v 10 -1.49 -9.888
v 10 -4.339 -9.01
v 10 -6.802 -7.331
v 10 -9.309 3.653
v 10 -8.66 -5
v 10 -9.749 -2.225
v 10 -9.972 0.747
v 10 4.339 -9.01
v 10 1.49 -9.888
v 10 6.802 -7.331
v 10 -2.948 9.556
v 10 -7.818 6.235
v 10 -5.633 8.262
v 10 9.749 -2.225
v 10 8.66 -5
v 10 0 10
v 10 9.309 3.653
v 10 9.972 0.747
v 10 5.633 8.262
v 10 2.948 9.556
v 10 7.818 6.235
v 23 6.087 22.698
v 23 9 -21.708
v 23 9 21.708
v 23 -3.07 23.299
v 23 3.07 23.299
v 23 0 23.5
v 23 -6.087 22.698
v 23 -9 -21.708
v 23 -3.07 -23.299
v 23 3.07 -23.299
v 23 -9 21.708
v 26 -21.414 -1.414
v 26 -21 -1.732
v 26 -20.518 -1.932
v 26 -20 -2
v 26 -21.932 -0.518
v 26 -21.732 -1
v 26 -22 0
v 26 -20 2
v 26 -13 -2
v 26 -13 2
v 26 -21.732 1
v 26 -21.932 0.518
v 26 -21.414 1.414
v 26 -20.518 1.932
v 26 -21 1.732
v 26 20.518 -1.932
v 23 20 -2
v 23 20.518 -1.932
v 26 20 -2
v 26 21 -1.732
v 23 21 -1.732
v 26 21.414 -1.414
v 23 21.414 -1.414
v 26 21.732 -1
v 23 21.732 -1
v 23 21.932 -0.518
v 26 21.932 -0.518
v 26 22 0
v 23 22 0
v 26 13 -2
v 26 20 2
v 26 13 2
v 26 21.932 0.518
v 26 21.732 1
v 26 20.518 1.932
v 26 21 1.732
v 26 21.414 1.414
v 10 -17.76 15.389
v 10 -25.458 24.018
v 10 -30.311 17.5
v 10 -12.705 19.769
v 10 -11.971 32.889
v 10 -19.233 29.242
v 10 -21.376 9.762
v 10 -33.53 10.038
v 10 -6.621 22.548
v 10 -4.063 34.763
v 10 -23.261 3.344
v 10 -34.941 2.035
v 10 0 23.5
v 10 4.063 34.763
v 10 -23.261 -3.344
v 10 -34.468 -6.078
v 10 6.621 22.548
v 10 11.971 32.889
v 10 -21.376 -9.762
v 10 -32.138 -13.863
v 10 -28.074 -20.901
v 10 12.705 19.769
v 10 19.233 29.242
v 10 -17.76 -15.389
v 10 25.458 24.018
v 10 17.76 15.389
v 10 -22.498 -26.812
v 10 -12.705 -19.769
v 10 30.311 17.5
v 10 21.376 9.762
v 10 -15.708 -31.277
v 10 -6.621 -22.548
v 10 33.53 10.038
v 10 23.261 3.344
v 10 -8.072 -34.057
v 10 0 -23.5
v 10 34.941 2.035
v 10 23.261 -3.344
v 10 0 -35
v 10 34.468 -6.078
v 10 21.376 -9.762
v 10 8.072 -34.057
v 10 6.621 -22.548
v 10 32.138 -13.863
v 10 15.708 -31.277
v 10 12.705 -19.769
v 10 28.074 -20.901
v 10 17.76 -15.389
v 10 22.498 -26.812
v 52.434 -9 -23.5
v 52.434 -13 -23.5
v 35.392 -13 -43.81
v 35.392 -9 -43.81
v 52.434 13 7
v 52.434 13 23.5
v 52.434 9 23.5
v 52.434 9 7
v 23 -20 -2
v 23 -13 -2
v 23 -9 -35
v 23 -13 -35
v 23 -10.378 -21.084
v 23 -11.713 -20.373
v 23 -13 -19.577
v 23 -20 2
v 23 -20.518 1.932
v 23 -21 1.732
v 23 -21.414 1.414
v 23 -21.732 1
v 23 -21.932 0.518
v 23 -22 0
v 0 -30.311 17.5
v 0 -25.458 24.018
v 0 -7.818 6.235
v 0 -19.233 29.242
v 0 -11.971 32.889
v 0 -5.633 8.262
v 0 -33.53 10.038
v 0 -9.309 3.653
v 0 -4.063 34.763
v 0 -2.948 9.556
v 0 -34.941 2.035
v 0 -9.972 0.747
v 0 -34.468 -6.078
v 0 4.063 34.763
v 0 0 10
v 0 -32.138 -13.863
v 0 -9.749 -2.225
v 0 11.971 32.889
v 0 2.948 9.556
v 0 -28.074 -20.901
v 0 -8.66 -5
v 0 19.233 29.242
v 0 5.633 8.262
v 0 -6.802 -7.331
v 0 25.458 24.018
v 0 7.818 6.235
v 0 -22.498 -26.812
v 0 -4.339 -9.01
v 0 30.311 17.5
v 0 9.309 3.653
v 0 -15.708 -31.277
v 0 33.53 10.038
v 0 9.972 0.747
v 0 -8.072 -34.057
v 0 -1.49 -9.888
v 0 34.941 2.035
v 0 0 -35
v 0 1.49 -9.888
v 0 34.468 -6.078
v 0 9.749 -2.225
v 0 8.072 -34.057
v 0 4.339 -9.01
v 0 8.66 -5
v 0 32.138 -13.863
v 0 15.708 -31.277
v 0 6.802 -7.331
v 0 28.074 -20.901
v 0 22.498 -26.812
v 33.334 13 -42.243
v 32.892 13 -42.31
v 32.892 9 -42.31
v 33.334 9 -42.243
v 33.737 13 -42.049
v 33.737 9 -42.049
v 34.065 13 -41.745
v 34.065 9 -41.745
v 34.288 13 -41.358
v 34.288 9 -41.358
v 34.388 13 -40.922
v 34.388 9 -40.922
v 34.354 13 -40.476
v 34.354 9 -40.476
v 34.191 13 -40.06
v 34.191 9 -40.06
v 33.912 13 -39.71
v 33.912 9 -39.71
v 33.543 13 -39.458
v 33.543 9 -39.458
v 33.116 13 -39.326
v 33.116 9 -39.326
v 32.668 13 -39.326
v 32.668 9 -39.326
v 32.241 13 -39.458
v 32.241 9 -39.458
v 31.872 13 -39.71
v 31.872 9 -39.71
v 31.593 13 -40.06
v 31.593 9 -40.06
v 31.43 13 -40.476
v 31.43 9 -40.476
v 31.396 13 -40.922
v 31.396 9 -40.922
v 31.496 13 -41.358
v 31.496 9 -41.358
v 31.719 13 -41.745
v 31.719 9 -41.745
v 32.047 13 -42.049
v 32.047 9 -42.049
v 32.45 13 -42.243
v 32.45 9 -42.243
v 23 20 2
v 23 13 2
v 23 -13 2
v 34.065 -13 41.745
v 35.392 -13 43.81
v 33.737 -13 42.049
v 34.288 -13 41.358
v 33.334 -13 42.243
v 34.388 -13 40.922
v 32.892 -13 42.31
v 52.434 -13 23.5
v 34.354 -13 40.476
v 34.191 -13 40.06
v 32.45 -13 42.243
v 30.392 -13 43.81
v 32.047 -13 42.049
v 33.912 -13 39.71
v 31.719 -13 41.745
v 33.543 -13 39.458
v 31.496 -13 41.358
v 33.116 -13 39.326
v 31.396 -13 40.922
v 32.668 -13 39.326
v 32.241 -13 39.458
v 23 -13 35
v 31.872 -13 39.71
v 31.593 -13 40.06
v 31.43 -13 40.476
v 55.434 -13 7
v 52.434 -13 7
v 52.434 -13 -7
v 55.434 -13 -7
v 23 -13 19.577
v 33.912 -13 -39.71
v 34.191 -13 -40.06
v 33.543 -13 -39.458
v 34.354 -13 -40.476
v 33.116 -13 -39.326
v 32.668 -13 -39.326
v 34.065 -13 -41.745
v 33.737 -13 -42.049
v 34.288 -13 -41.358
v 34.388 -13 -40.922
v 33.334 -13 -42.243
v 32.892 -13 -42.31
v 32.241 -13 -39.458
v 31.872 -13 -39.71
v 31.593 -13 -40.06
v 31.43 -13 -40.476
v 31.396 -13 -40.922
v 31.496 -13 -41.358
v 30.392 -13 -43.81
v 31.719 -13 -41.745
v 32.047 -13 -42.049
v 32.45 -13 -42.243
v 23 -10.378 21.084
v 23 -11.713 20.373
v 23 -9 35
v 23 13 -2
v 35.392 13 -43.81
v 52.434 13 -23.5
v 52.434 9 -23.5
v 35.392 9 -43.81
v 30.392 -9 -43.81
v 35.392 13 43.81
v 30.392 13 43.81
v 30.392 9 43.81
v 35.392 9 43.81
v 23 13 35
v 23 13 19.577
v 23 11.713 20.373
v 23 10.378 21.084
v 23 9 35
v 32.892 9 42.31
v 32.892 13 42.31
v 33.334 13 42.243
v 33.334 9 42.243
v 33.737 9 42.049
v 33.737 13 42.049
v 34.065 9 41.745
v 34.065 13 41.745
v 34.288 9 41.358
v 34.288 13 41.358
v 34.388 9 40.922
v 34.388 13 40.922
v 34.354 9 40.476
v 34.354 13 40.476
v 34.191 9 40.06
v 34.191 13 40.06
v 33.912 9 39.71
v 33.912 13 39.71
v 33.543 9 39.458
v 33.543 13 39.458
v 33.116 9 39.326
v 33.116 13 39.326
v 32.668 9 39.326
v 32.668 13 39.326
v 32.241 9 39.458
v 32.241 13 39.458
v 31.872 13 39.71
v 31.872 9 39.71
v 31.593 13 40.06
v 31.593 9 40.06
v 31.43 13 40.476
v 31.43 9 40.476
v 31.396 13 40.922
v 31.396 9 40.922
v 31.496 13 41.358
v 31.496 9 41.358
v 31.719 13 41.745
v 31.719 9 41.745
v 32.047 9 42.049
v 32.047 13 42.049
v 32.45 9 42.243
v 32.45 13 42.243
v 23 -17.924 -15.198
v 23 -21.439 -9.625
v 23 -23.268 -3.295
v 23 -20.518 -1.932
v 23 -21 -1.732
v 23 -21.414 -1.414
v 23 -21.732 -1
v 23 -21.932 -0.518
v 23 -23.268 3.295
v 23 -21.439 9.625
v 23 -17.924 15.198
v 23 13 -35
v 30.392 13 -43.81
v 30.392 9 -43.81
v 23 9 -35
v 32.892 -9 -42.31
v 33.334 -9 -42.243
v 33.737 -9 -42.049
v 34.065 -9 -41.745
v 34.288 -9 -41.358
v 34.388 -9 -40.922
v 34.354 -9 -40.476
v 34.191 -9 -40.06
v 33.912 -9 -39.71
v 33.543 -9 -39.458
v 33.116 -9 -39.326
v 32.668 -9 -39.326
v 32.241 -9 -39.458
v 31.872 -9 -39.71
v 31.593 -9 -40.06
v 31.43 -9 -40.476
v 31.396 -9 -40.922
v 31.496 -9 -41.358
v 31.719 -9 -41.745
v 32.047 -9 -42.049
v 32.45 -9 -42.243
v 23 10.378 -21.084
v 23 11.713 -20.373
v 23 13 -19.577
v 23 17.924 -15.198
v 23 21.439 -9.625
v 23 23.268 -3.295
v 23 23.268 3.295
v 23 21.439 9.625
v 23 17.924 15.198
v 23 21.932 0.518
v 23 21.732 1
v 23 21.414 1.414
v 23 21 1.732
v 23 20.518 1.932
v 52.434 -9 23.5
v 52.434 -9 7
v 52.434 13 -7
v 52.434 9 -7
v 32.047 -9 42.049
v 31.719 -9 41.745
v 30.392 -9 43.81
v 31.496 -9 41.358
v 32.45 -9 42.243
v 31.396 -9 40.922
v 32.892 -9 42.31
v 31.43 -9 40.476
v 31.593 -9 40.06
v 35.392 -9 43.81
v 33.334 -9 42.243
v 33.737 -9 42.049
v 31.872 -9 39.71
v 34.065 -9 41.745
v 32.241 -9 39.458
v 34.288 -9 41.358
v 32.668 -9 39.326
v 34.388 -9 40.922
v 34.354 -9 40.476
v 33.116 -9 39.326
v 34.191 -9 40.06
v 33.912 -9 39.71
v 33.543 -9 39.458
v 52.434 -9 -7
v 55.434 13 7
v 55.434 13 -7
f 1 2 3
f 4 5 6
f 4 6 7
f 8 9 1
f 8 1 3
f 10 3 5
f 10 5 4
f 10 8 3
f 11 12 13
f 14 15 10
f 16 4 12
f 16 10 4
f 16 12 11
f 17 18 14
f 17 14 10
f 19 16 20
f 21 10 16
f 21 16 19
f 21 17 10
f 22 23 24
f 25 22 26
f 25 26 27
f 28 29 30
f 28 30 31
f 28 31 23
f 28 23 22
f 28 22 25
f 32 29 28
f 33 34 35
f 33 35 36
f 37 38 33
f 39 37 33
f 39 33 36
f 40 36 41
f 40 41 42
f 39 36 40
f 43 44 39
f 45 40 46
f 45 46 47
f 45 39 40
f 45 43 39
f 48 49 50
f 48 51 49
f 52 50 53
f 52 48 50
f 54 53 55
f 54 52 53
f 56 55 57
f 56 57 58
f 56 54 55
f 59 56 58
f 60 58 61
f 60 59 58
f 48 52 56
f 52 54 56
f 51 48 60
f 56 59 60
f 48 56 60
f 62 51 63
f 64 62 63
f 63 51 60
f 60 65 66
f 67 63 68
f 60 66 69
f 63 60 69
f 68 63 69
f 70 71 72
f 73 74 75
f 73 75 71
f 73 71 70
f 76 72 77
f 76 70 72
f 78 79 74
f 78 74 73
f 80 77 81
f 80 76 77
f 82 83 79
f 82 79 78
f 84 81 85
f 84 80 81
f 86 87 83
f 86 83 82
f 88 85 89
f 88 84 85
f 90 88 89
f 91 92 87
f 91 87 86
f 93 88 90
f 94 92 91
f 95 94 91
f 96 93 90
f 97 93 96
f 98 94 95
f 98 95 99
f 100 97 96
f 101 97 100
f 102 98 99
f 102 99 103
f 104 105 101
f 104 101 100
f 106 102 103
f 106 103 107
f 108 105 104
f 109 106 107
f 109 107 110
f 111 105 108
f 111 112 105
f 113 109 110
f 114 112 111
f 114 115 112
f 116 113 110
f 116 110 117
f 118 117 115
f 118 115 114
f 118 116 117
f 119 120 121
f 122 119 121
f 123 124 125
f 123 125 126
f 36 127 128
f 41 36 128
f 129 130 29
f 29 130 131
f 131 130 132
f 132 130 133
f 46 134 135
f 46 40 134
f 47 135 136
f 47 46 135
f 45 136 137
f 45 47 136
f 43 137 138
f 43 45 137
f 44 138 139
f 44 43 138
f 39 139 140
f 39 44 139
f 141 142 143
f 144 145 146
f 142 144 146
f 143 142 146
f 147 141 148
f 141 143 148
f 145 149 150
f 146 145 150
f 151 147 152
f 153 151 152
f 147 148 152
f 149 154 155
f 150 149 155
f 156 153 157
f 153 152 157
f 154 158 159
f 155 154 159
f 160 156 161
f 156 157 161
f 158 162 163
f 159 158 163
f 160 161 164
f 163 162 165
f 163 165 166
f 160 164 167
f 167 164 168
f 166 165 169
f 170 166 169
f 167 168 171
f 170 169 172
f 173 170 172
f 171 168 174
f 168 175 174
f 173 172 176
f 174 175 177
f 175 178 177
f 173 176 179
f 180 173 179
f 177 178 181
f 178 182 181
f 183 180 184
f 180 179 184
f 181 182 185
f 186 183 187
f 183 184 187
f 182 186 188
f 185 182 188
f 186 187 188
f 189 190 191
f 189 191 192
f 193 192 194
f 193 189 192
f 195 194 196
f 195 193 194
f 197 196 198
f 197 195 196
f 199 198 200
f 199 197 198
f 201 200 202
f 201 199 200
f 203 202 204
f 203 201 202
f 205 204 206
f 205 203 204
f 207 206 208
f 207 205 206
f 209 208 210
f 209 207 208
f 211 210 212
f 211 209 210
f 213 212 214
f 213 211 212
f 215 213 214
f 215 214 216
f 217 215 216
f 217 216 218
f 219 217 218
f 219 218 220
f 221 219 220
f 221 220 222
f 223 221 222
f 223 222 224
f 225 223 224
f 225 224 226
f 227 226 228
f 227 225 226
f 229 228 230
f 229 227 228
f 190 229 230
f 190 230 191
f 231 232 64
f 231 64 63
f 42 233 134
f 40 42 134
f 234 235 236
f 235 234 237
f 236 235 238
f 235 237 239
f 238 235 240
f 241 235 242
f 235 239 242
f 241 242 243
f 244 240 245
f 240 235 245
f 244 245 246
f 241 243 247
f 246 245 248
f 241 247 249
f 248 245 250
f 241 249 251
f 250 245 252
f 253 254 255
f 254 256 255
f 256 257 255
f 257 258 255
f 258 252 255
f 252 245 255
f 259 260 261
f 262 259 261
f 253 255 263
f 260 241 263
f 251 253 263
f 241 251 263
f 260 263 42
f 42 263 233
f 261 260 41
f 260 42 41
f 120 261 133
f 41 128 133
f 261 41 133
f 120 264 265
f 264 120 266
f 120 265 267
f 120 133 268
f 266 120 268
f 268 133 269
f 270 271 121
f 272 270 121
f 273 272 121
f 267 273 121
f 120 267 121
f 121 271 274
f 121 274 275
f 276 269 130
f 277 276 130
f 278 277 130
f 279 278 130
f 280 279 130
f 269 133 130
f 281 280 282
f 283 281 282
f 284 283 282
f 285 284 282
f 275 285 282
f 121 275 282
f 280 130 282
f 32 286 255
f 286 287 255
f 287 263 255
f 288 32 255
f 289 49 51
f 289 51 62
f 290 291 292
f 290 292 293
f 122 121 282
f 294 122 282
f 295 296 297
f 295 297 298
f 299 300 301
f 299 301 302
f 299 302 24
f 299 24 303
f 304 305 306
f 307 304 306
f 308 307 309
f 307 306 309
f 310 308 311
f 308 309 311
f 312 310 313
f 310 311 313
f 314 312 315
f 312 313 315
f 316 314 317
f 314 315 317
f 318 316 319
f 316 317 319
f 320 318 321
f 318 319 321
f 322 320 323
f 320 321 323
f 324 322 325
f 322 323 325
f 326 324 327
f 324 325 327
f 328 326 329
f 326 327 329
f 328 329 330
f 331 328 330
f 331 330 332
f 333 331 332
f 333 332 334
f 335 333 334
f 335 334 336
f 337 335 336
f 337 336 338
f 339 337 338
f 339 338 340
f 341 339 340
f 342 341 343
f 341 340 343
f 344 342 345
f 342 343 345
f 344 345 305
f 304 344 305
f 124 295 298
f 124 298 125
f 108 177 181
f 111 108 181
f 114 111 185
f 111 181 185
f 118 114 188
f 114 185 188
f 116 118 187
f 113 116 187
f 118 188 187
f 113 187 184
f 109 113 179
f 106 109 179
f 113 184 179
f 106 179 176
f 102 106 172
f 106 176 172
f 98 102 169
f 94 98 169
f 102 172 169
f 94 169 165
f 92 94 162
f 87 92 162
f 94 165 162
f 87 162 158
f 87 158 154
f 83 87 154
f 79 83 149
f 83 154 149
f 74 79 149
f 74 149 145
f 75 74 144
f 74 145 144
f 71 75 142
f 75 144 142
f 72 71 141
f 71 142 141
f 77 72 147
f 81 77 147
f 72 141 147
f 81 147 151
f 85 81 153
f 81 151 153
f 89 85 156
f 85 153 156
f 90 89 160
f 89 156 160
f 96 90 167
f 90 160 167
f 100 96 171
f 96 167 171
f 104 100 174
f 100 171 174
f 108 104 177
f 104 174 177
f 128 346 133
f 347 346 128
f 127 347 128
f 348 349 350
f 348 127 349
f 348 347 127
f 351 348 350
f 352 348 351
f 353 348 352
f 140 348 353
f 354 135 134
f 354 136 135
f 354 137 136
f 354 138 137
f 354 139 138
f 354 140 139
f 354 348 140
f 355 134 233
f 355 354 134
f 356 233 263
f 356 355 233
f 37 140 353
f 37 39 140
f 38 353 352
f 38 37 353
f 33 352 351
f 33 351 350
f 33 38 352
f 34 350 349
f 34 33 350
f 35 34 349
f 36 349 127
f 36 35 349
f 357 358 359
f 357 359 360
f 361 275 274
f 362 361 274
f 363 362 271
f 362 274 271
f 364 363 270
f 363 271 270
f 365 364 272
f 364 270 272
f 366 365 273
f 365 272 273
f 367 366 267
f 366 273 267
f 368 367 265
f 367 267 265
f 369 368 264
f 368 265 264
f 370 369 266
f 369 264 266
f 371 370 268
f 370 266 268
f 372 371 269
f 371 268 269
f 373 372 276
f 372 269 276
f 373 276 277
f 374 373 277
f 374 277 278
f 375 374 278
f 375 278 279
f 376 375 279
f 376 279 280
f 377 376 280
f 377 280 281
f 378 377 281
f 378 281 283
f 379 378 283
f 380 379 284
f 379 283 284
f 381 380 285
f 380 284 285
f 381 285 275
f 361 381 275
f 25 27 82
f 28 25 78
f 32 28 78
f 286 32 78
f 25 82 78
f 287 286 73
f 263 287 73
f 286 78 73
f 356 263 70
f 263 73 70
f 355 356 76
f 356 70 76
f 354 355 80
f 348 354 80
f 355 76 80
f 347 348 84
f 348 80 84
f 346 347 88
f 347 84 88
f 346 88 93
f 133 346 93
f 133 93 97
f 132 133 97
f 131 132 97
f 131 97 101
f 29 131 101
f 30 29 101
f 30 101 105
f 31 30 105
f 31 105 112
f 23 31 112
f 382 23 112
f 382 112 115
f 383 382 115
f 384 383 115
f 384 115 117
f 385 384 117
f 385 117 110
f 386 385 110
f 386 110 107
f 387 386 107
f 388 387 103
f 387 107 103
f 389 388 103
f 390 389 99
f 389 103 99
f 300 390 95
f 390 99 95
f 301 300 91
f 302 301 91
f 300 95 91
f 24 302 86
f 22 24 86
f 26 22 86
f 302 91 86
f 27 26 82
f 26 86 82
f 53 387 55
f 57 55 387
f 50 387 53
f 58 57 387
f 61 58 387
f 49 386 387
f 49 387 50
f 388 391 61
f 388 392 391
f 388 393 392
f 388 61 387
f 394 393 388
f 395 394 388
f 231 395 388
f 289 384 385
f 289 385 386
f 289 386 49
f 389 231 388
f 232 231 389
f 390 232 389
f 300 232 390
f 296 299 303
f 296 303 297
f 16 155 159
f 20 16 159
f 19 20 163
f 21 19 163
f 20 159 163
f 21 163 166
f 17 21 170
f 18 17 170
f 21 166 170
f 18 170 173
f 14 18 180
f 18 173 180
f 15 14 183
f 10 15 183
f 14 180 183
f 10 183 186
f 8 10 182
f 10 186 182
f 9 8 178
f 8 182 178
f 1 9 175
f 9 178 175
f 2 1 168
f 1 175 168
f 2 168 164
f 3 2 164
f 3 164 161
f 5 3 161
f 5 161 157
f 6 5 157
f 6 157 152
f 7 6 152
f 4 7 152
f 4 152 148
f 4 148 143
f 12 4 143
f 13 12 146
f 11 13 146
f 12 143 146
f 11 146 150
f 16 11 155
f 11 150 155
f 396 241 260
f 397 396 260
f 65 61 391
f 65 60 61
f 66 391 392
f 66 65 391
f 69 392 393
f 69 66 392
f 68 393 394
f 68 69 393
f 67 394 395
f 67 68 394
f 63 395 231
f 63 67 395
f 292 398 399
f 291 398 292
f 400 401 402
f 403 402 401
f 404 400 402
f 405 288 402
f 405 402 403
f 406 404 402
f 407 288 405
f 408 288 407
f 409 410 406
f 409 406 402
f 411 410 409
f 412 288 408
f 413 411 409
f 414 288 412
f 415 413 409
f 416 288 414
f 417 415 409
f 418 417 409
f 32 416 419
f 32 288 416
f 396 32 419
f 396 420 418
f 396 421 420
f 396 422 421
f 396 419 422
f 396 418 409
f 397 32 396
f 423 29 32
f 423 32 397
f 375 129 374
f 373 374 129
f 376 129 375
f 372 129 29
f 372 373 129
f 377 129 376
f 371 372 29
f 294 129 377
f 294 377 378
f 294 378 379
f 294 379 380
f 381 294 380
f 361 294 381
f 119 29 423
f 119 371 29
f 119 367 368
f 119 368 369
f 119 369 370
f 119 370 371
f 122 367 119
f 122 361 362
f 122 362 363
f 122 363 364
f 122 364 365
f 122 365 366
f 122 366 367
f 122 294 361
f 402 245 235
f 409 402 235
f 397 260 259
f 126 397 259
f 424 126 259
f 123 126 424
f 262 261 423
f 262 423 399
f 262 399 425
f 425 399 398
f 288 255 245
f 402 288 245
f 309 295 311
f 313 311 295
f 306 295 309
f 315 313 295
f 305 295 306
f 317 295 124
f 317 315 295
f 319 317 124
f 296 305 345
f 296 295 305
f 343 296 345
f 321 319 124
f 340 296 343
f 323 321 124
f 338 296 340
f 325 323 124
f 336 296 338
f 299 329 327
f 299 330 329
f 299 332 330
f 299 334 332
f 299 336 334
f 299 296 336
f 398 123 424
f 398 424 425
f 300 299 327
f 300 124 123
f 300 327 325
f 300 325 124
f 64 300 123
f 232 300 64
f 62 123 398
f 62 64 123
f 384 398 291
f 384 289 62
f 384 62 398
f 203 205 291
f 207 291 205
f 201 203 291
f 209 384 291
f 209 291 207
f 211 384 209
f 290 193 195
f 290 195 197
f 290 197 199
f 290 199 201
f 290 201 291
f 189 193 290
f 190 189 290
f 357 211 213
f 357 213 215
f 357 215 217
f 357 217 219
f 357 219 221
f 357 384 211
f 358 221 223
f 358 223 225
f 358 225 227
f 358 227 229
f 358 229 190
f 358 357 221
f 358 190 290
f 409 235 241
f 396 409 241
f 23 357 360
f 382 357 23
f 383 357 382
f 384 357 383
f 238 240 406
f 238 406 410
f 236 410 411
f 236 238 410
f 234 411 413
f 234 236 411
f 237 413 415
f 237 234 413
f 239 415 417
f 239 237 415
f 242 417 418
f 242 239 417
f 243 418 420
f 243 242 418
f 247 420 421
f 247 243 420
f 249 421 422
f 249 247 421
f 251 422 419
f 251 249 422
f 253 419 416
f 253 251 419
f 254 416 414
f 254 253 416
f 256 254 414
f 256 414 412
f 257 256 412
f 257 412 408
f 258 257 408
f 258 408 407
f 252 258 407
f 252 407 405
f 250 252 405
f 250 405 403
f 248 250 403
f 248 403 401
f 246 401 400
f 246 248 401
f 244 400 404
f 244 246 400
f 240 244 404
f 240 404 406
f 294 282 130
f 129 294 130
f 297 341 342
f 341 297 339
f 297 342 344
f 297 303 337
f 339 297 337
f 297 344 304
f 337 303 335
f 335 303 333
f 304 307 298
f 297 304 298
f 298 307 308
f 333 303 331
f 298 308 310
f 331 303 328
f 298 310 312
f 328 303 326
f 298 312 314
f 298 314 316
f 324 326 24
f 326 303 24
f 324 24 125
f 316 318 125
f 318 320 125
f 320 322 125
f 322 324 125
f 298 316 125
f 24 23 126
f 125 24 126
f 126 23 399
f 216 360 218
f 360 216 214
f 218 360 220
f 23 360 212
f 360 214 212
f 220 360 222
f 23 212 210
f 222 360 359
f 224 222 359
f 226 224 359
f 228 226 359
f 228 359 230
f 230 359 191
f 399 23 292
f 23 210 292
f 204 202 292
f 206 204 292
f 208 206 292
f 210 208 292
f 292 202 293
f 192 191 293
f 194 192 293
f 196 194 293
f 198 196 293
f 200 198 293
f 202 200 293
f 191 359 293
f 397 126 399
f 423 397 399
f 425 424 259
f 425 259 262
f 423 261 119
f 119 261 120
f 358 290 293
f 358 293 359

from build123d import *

# Parameters (mm, degrees)
SKETCH1_R               = 35
BOSS_EXTRUDE1_DEPTH     = 10
SKETCH2_R               = 23.5
BOSS_EXTRUDE2_DEPTH     = 13
BOSS_EXTRUDE3_DEPTH     = 4
SKETCH4_R               = 1.5
CUT_EXTRUDE1_DEPTH      = 4
MIRROR2_COPY_1_SKETCH_R = 1.5
MIRROR2_COPY_1_DEPTH    = 4
BOSS_EXTRUDE4_DEPTH     = 3
FILLET1_R               = 2
FILLET1_OF_MIRROR3_R    = 2
SKETCH6_W               = 14
SKETCH6_H               = 26
BOSS_EXTRUDE5_DEPTH     = 3
SKETCH7_R               = 10
CUT_EXTRUDE2_DEPTH      = 10


with BuildPart() as part:
    # Sketch1 → Boss-Extrude1 (new body)
    with BuildSketch(Plane(origin=(0, 0, 0), x_dir=(0, 0, -1), z_dir=(1, 0, 0))):
        Circle(SKETCH1_R)
    extrude(amount=BOSS_EXTRUDE1_DEPTH)

    # Sketch2 → Boss-Extrude2 (add)
    with BuildSketch(Plane(origin=(10, 0, 0), x_dir=(0, 0, -1), z_dir=(1, 0, 0))):
        with Locations(Location((0, 0, 0), (0, 0, 180))):
            Circle(SKETCH2_R)
    extrude(amount=BOSS_EXTRUDE2_DEPTH)

    # Sketch3 → Boss-Extrude3 (add)
    with BuildSketch(Plane(origin=(0, 13, 0), x_dir=(1, 0, 0), z_dir=(0, 1, 0))):
        Polygon((23, 35), (23, -35), (30.392057511, -43.809511096), (35.392057511, -43.809511096), (52.433760781, -23.5), (52.433760781, 23.5), (35.392057511, 43.809511096), (30.392057511, 43.809511096), align=None)
    boss_extrude3 = extrude(amount=-BOSS_EXTRUDE3_DEPTH)

    # Sketch4 → Cut-Extrude1 (cut)
    with BuildSketch(Plane(origin=(0, 13, 0), x_dir=(1, 0, 0), z_dir=(0, 1, 0))):
        with Locations(Location((32.892057511, -40.809511096, 0), (0, 0, 270))):
            Circle(SKETCH4_R)
    cut_extrude1 = extrude(amount=-CUT_EXTRUDE1_DEPTH, mode=Mode.SUBTRACT)

    # Mirror1: Cut-Extrude1 across plane
    add(cut_extrude1.mirror(Plane.XY), mode=Mode.SUBTRACT)

    # Mirror2: Boss-Extrude3, Cut-Extrude1 across plane
    add(boss_extrude3.mirror(Plane.ZX))
    add(cut_extrude1.mirror(Plane.ZX), mode=Mode.SUBTRACT)

    # Mirror2 copy 1 sketch → Mirror2 copy 1 (cut)
    with BuildSketch(Plane.XZ.offset(13)):
        with Locations(Location((32.892057511, -40.809511096, 0), (0, 0, 270))):
            Circle(MIRROR2_COPY_1_SKETCH_R)
    extrude(amount=-MIRROR2_COPY_1_DEPTH, mode=Mode.SUBTRACT)

    # Sketch5 → Boss-Extrude4 (add)
    with BuildSketch(Plane(origin=(23, 0, 0), x_dir=(0, 0, -1), z_dir=(1, 0, 0))):
        Polygon((0, 13), (-2, 13), (-2, 22), (2, 22), (2, 13), align=None)
    boss_extrude4 = extrude(amount=BOSS_EXTRUDE4_DEPTH)

    # Fillet1
    fillet1_edges = [part.edges().sort_by_distance(p)[0] for p in [
        (24.5, 22, 2),
        (24.5, 22, -2),
    ]]
    fillet(fillet1_edges, radius=FILLET1_R - 0.0001)  # a hair under: the kernel refuses the full size

    # Mirror3: Boss-Extrude4 across plane
    add(boss_extrude4.mirror(Plane.ZX))

    # Fillet1 of Mirror3
    fillet1_of_mirror3_edges = [part.edges().sort_by_distance(p)[0] for p in [
        (24.5, -22, 2),
        (24.5, -22, -2),
    ]]
    fillet(fillet1_of_mirror3_edges, radius=FILLET1_OF_MIRROR3_R - 0.0001)  # a hair under: the kernel refuses the full size

    # Sketch6 → Boss-Extrude5 (add)
    with BuildSketch(Plane(origin=(52.433760781, 0, 0), x_dir=(0, 0, -1), z_dir=(1, 0, 0))):
        Rectangle(SKETCH6_W, SKETCH6_H)
    extrude(amount=BOSS_EXTRUDE5_DEPTH)

    # Sketch7 → Cut-Extrude2 (cut)
    with BuildSketch(Plane.ZY):
        Circle(SKETCH7_R)
    extrude(amount=-CUT_EXTRUDE2_DEPTH, mode=Mode.SUBTRACT)


solid = part.part
